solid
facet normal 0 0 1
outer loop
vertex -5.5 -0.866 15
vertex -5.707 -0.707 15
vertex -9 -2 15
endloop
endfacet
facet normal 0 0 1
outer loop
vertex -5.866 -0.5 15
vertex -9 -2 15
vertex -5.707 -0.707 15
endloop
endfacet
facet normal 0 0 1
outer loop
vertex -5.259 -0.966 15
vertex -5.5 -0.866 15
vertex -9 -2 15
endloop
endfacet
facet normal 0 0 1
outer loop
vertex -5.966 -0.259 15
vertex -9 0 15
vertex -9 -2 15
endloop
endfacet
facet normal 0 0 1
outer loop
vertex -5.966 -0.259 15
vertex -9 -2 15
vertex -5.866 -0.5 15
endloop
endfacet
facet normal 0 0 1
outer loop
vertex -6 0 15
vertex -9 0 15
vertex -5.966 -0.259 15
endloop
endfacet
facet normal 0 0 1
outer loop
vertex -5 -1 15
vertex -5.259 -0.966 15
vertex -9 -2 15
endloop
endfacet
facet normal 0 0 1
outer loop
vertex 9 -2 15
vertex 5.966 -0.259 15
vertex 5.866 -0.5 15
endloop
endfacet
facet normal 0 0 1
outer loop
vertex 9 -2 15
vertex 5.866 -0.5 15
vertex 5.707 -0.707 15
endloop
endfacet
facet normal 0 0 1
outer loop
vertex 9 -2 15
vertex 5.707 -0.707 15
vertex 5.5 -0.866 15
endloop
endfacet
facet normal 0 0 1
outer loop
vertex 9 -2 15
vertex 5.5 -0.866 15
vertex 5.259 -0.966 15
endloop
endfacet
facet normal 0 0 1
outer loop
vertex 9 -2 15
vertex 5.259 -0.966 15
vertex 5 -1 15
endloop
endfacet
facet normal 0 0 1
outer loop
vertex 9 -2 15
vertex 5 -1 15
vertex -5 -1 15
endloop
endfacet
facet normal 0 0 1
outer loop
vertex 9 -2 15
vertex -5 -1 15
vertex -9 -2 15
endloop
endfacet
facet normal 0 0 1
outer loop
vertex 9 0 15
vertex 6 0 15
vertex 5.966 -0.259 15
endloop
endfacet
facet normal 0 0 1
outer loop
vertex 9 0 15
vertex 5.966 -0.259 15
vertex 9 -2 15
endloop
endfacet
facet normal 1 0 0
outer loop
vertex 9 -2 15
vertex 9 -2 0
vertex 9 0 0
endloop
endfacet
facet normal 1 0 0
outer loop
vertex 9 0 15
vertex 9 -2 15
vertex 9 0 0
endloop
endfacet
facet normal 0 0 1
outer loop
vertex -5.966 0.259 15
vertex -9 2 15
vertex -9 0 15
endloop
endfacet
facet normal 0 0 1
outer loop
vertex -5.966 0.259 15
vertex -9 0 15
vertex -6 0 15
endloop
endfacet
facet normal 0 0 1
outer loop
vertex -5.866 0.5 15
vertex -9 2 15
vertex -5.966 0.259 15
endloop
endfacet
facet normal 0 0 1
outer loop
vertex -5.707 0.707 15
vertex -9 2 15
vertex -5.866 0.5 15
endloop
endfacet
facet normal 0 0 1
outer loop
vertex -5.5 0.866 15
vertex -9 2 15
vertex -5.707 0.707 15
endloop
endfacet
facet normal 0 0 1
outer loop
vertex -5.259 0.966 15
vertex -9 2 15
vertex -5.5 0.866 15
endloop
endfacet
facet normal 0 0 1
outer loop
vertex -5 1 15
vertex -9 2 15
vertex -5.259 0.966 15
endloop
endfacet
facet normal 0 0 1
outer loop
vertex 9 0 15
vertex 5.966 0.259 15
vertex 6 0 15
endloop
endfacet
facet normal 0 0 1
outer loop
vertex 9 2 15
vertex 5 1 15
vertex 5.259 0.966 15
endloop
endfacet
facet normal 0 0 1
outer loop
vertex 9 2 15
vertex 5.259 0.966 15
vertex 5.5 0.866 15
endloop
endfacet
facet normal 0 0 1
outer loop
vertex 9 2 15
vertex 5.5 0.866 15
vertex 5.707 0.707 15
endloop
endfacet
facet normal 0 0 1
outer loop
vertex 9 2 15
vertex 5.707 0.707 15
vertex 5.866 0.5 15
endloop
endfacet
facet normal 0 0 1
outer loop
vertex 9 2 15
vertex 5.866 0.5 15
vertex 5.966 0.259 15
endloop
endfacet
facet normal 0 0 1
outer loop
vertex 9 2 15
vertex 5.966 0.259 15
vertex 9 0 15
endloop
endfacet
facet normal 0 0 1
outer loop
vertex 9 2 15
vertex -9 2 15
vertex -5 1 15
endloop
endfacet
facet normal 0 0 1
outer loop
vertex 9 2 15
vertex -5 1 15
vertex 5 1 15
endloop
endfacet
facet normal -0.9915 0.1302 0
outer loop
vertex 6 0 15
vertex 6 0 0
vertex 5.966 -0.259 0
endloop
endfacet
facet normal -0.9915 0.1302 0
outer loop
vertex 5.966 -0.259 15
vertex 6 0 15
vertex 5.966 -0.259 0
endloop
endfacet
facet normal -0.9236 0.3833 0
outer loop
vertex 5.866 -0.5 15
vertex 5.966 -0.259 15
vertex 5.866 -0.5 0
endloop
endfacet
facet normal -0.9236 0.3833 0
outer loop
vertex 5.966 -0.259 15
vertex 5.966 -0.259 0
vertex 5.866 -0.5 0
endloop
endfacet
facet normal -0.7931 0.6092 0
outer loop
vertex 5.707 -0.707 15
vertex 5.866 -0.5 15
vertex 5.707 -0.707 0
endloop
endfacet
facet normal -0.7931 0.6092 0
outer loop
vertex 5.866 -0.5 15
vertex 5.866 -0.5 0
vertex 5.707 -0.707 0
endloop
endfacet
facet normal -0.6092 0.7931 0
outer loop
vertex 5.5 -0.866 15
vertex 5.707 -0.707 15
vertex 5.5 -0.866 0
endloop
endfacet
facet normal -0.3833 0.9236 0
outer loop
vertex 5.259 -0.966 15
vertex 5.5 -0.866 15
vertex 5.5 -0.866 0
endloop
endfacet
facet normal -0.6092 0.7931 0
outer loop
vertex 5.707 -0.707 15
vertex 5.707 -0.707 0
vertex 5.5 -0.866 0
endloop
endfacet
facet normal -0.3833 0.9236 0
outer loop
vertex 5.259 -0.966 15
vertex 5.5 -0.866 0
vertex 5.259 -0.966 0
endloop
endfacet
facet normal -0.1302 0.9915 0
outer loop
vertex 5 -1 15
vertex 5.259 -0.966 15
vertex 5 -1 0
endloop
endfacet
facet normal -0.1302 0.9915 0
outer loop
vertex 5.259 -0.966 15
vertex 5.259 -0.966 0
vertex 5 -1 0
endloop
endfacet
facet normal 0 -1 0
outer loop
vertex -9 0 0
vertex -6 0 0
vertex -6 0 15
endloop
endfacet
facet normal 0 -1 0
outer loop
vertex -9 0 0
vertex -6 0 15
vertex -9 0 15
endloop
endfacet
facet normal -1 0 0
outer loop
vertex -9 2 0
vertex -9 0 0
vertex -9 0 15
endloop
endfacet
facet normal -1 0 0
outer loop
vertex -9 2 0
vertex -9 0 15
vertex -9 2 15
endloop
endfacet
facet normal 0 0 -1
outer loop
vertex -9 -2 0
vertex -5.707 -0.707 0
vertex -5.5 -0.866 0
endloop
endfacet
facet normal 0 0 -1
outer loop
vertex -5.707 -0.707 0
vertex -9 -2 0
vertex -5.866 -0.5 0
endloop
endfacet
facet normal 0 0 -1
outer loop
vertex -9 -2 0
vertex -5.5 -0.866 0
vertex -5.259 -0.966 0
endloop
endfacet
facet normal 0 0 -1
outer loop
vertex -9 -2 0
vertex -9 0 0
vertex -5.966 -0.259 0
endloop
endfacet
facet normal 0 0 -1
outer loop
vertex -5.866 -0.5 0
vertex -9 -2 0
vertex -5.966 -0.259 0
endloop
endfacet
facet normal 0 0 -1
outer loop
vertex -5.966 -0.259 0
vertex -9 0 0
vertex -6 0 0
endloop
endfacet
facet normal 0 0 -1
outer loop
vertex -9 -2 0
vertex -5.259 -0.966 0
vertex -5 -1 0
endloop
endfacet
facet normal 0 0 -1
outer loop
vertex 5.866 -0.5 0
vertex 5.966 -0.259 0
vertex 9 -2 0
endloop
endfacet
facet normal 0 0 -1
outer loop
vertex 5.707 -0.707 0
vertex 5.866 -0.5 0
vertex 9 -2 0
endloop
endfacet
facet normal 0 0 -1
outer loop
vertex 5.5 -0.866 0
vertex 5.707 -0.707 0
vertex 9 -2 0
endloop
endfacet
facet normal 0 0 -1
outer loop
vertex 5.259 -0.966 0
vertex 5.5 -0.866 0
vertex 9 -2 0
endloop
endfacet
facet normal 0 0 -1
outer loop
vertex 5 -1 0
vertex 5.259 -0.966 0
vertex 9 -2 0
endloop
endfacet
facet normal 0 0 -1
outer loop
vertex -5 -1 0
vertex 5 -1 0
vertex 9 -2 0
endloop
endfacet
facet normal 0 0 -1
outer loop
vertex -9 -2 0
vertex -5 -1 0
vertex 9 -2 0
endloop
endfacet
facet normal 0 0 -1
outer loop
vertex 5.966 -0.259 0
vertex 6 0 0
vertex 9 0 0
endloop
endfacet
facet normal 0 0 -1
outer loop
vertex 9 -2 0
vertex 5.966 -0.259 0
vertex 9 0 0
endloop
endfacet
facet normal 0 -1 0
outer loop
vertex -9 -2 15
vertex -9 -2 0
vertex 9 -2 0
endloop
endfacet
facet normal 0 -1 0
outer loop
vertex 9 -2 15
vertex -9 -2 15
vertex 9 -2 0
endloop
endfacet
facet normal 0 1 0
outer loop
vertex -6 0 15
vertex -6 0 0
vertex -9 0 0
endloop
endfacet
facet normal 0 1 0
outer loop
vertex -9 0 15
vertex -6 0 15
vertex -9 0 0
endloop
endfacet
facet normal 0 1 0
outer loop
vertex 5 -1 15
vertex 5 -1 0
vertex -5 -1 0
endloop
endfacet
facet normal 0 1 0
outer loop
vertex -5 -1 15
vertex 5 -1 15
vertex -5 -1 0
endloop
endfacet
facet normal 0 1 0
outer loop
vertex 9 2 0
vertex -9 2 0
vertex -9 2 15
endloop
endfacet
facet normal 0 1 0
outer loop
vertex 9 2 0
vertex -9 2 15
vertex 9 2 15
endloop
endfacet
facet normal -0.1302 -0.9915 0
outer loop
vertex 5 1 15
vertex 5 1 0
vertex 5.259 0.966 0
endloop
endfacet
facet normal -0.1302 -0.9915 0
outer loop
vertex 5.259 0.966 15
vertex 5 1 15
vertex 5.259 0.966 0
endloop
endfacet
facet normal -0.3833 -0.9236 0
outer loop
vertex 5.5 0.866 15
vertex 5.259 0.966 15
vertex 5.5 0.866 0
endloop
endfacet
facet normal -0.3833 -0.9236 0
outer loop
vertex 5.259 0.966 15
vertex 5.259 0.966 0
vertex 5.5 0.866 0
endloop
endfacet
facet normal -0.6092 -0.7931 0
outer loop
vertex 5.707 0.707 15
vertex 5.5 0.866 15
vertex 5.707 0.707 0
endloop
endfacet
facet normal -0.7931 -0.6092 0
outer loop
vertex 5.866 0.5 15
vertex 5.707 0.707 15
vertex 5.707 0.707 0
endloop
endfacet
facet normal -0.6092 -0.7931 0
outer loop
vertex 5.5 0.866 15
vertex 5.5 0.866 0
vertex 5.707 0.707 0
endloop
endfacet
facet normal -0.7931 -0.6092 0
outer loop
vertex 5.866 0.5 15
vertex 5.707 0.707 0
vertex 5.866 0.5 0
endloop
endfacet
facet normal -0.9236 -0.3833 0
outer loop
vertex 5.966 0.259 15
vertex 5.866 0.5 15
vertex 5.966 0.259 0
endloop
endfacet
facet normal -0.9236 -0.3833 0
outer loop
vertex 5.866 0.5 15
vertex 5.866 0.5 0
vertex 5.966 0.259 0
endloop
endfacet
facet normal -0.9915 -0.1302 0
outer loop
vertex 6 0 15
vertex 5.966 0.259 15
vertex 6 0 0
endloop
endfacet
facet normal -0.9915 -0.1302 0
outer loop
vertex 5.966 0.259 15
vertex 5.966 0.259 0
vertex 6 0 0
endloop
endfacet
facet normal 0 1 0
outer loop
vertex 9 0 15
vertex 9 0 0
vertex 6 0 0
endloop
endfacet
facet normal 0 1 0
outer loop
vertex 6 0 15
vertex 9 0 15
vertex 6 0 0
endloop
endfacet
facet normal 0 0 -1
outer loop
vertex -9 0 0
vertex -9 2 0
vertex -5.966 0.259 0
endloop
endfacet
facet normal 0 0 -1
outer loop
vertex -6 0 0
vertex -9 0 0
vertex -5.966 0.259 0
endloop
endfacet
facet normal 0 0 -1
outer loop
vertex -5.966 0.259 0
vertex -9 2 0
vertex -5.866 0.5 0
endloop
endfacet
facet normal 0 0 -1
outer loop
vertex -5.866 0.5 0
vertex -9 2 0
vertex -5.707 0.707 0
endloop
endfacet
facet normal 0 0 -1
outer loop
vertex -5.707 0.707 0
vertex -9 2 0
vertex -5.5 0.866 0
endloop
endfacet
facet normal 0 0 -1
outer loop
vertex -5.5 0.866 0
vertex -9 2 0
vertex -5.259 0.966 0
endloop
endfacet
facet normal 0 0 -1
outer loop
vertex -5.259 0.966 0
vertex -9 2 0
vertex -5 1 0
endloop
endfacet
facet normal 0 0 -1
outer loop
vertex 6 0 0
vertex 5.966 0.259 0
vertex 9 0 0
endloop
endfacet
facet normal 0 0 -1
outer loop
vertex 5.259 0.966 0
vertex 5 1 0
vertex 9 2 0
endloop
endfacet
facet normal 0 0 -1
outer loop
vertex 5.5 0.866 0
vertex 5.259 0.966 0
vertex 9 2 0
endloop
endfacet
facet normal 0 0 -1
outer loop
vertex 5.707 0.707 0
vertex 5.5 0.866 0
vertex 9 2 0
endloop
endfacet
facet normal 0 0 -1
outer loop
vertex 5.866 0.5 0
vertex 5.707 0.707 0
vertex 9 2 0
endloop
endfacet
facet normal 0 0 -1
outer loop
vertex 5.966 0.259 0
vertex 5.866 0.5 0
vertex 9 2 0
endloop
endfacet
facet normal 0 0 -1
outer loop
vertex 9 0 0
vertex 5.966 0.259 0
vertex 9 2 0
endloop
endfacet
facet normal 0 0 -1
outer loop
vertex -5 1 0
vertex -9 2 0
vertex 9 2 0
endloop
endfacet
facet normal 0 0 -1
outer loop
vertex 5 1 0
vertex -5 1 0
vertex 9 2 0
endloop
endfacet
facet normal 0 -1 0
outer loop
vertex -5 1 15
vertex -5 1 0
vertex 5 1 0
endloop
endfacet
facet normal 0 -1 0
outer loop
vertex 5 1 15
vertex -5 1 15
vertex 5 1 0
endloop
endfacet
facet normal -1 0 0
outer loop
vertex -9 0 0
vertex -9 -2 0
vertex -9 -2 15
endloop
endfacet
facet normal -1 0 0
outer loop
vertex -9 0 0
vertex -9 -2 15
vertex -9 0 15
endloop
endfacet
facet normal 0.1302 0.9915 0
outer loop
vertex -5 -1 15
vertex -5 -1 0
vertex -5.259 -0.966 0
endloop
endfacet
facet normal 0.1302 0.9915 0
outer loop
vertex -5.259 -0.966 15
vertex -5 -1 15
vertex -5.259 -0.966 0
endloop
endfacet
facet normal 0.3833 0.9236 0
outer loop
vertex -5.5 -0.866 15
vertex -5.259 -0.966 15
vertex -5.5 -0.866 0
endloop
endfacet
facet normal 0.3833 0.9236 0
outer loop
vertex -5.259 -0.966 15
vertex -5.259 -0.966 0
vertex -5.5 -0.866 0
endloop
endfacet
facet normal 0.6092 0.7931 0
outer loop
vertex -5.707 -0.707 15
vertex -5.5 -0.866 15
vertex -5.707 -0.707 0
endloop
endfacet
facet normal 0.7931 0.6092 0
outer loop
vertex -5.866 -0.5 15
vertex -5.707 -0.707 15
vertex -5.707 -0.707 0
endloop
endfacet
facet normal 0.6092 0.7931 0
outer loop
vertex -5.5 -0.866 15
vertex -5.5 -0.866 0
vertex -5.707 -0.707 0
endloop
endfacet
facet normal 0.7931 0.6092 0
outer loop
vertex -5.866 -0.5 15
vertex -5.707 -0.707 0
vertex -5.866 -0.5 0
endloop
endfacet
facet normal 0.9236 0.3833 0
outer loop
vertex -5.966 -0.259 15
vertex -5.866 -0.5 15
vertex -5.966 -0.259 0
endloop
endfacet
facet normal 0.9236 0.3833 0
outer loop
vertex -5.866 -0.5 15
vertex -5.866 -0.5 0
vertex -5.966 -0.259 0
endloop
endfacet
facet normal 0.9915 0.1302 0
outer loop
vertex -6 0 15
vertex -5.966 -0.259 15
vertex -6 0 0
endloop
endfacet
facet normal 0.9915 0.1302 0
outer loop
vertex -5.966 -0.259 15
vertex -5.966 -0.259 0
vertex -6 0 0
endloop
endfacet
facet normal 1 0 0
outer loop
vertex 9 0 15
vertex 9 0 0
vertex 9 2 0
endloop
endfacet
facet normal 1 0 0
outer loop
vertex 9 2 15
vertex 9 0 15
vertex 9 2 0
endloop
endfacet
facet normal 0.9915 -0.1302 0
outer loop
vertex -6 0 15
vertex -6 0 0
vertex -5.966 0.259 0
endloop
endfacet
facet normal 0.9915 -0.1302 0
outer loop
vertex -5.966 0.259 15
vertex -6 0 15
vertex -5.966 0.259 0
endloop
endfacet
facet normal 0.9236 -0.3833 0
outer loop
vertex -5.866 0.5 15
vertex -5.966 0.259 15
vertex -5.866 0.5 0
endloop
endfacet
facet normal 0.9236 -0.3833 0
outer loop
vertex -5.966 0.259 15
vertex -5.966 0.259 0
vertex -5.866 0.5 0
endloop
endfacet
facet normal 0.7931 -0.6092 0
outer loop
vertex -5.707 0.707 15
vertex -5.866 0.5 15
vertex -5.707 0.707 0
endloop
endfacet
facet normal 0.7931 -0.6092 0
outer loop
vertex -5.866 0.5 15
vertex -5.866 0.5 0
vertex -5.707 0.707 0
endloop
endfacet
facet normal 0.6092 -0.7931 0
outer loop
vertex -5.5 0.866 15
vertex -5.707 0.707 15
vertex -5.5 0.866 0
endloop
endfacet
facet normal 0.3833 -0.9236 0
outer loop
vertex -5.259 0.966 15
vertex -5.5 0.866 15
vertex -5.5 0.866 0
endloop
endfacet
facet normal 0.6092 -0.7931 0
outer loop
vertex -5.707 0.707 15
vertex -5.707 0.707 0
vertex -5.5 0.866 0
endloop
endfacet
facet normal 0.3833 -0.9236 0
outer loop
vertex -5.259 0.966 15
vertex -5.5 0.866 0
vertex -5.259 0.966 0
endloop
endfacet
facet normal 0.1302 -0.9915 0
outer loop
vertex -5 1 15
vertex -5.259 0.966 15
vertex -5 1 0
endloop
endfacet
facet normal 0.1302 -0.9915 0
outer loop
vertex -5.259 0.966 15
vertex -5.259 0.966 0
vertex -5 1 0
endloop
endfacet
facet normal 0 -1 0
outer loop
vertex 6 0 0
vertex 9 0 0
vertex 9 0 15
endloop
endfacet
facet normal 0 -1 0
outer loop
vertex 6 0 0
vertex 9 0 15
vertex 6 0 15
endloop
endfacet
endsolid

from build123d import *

# Parameters (mm, degrees)
SKETCH_2_W                     = 18
SKETCH_2_H                     = 4
EXTRUDE_1_DEPTH                = 15
CUT_EXTRUDE_1_DEPTH            = 15
SPLIT_BODIES_1_SURFACE_1_BACK  = 24.77
SPLIT_BODIES_1_SURFACE_1_DEPTH = 49.54
SPLIT_BODIES_1_SURFACE_2_BACK  = 24.77
SPLIT_BODIES_1_SURFACE_2_DEPTH = 49.54


with BuildPart() as part:
    # 스케치2 → 보스-돌출1 (new body)
    with BuildSketch(Plane.XY):
        Rectangle(SKETCH_2_W, SKETCH_2_H)
    extrude(amount=EXTRUDE_1_DEPTH)

    # 스케치1 → 컷-돌출1 (cut)
    with BuildSketch(Plane.XY):
        with BuildLine():
            Line((-5, 1), (5, 1))
            ThreePointArc((5, 1), (6, 0), (5, -1))
            Line((5, -1), (-5, -1))
            ThreePointArc((-5, -1), (-6, 0), (-5, 1))
        make_face()
    extrude(amount=CUT_EXTRUDE_1_DEPTH, mode=Mode.SUBTRACT)


with BuildPart() as body_2:
    # Split Bodies 1: the piece behind the surface
    add(part.part)
    # Split Bodies 1 surface: a surface, the sketch's curves swept straight by 49.54 mm
    with BuildLine(Plane.XY.offset(15).offset(-SPLIT_BODIES_1_SURFACE_1_BACK), mode=Mode.PRIVATE) as split_bodies_1_surface_1_path:
        Line((9, 0), (-9, 0))
    split_bodies_1_surface_1 = Shell.extrude(split_bodies_1_surface_1_path.wire(), (0 * SPLIT_BODIES_1_SURFACE_1_DEPTH, 0 * SPLIT_BODIES_1_SURFACE_1_DEPTH, 1 * SPLIT_BODIES_1_SURFACE_1_DEPTH))
    split(bisect_by=split_bodies_1_surface_1, keep=Keep.BOTTOM)


with BuildPart() as part_1:
    add(part.part)

    # Split Bodies 1: split by a surface, the side it looks to stays
    # Split Bodies 1 surface: a surface, the sketch's curves swept straight by 49.54 mm
    with BuildLine(Plane.XY.offset(15).offset(-SPLIT_BODIES_1_SURFACE_2_BACK), mode=Mode.PRIVATE) as split_bodies_1_surface_2_path:
        Line((9, 0), (-9, 0))
    split_bodies_1_surface_2 = Shell.extrude(split_bodies_1_surface_2_path.wire(), (0 * SPLIT_BODIES_1_SURFACE_2_DEPTH, 0 * SPLIT_BODIES_1_SURFACE_2_DEPTH, 1 * SPLIT_BODIES_1_SURFACE_2_DEPTH))
    split(bisect_by=split_bodies_1_surface_2, keep=Keep.TOP)


solid = Compound([body_2.part, part_1.part])
